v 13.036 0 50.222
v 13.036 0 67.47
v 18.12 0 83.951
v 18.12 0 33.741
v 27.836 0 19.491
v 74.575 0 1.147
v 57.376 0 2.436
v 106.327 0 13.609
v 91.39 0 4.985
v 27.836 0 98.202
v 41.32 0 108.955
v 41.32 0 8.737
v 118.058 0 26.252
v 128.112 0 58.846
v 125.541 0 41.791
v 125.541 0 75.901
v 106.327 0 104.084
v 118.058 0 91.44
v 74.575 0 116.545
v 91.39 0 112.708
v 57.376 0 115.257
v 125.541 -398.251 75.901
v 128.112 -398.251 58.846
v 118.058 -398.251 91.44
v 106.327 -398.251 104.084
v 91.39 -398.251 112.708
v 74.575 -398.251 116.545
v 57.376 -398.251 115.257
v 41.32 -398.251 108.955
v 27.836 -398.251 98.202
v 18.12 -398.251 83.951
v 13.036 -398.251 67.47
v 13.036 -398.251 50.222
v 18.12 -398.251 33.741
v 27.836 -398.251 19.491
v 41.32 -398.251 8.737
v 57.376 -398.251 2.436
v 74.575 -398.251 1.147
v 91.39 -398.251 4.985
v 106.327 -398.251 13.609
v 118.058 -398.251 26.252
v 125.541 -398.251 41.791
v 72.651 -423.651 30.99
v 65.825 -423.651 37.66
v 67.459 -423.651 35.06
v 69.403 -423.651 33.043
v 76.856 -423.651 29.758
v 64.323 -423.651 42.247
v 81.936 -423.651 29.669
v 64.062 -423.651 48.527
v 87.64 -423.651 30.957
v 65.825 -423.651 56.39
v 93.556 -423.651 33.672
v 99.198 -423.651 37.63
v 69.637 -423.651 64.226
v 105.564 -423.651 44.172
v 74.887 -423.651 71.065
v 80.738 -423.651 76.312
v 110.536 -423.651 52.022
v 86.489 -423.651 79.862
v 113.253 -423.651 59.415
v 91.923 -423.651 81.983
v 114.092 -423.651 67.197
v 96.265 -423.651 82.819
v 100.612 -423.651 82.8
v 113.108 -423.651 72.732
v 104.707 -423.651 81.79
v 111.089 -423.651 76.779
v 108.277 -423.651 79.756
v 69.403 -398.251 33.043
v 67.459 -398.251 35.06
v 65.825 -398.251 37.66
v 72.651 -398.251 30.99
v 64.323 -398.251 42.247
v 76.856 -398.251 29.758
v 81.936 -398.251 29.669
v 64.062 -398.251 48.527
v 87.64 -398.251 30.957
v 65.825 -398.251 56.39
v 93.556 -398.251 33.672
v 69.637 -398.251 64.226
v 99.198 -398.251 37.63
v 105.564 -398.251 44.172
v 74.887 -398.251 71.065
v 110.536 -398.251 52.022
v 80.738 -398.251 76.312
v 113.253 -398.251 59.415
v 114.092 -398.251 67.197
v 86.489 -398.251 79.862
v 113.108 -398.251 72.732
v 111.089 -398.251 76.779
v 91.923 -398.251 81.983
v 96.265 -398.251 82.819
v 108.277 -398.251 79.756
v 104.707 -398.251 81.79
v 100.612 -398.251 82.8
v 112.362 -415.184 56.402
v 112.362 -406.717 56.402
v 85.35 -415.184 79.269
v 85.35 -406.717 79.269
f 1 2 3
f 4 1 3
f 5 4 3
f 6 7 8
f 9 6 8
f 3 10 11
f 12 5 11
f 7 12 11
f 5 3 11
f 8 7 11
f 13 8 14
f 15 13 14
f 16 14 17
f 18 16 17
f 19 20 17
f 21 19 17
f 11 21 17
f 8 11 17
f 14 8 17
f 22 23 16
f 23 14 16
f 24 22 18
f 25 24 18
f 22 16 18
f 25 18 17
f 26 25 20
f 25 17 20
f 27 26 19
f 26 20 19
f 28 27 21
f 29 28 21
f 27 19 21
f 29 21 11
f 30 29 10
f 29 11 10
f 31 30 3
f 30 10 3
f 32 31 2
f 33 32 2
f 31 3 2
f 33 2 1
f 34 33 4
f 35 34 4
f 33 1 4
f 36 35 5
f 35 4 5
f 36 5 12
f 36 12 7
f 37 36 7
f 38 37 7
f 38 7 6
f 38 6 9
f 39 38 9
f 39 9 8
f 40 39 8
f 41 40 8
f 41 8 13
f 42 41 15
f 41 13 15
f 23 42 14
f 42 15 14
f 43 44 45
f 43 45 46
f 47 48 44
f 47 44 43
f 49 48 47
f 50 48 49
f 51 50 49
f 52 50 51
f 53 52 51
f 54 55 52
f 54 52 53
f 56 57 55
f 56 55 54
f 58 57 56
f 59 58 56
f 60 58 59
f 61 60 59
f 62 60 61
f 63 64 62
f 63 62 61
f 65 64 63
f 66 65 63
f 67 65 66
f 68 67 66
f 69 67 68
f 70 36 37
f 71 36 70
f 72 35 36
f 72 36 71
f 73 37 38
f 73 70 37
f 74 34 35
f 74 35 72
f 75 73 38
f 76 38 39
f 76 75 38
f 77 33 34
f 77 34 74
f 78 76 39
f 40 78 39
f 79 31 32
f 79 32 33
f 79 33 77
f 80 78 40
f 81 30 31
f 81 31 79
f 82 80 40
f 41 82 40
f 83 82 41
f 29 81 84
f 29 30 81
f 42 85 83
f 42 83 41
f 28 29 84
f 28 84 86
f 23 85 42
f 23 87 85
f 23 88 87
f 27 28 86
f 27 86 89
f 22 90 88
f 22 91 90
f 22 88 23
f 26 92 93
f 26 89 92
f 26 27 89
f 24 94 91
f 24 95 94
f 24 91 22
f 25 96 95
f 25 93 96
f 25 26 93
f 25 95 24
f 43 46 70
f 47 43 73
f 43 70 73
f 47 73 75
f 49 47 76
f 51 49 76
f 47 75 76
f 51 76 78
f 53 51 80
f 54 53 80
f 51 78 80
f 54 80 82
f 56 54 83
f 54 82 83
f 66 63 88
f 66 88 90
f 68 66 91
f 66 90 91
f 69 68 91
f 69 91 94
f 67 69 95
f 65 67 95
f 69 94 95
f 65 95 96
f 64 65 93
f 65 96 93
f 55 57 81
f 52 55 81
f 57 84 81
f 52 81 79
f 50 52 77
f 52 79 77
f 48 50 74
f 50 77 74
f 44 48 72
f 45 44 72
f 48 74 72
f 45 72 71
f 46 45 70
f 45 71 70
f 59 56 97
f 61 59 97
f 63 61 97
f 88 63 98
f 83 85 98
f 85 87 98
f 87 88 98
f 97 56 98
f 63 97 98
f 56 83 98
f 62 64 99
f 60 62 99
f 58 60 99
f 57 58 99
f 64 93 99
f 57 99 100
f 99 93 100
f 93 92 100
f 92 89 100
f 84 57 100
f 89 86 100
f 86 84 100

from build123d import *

# Parameters (mm, degrees)
F0_R      = 57.861
F1_DEPTH  = 253.413677
F1_FACE_R = 57.861
F2_DEPTH  = 144.836873
F5_DEPTH  = 25.4


with BuildPart() as f1:
    # F0 (on Front) → F1 (new body)
    with BuildSketch(Plane.XZ):
        with Locations((70.250988, 58.846217)):
            Circle(F0_R)
    extrude(amount=F1_DEPTH)

    # F1_face (on face) → F2 (join)
    with BuildSketch(Plane(origin=(70.250988, -253.413677, 58.846217), x_dir=(1, 0, 0), z_dir=(0, -1, 0))):
        Circle(F1_FACE_R)
    extrude(amount=F2_DEPTH)

    # F4 (on face) → F5 (join)
    with BuildSketch(Plane.XZ.offset(398.25055)):
        with BuildLine():
            add(Edge.make_bspline(
                [(69.40268, 33.042915), (96.414929, 10.176068), (112.361828, 56.401889), (128.308728, 102.62771), (85.34958, 79.268736), (42.390431, 55.909762), (69.40268, 33.042915)],
                knots=[0, 0, 0, 2.094395, 2.094395, 4.18879, 4.18879, 6.283185, 6.283185, 6.283185], degree=2, weights=[1, 0.5, 1, 0.5, 1, 0.5, 1]))
        make_face()
    extrude(amount=F5_DEPTH)


solid = f1.part
